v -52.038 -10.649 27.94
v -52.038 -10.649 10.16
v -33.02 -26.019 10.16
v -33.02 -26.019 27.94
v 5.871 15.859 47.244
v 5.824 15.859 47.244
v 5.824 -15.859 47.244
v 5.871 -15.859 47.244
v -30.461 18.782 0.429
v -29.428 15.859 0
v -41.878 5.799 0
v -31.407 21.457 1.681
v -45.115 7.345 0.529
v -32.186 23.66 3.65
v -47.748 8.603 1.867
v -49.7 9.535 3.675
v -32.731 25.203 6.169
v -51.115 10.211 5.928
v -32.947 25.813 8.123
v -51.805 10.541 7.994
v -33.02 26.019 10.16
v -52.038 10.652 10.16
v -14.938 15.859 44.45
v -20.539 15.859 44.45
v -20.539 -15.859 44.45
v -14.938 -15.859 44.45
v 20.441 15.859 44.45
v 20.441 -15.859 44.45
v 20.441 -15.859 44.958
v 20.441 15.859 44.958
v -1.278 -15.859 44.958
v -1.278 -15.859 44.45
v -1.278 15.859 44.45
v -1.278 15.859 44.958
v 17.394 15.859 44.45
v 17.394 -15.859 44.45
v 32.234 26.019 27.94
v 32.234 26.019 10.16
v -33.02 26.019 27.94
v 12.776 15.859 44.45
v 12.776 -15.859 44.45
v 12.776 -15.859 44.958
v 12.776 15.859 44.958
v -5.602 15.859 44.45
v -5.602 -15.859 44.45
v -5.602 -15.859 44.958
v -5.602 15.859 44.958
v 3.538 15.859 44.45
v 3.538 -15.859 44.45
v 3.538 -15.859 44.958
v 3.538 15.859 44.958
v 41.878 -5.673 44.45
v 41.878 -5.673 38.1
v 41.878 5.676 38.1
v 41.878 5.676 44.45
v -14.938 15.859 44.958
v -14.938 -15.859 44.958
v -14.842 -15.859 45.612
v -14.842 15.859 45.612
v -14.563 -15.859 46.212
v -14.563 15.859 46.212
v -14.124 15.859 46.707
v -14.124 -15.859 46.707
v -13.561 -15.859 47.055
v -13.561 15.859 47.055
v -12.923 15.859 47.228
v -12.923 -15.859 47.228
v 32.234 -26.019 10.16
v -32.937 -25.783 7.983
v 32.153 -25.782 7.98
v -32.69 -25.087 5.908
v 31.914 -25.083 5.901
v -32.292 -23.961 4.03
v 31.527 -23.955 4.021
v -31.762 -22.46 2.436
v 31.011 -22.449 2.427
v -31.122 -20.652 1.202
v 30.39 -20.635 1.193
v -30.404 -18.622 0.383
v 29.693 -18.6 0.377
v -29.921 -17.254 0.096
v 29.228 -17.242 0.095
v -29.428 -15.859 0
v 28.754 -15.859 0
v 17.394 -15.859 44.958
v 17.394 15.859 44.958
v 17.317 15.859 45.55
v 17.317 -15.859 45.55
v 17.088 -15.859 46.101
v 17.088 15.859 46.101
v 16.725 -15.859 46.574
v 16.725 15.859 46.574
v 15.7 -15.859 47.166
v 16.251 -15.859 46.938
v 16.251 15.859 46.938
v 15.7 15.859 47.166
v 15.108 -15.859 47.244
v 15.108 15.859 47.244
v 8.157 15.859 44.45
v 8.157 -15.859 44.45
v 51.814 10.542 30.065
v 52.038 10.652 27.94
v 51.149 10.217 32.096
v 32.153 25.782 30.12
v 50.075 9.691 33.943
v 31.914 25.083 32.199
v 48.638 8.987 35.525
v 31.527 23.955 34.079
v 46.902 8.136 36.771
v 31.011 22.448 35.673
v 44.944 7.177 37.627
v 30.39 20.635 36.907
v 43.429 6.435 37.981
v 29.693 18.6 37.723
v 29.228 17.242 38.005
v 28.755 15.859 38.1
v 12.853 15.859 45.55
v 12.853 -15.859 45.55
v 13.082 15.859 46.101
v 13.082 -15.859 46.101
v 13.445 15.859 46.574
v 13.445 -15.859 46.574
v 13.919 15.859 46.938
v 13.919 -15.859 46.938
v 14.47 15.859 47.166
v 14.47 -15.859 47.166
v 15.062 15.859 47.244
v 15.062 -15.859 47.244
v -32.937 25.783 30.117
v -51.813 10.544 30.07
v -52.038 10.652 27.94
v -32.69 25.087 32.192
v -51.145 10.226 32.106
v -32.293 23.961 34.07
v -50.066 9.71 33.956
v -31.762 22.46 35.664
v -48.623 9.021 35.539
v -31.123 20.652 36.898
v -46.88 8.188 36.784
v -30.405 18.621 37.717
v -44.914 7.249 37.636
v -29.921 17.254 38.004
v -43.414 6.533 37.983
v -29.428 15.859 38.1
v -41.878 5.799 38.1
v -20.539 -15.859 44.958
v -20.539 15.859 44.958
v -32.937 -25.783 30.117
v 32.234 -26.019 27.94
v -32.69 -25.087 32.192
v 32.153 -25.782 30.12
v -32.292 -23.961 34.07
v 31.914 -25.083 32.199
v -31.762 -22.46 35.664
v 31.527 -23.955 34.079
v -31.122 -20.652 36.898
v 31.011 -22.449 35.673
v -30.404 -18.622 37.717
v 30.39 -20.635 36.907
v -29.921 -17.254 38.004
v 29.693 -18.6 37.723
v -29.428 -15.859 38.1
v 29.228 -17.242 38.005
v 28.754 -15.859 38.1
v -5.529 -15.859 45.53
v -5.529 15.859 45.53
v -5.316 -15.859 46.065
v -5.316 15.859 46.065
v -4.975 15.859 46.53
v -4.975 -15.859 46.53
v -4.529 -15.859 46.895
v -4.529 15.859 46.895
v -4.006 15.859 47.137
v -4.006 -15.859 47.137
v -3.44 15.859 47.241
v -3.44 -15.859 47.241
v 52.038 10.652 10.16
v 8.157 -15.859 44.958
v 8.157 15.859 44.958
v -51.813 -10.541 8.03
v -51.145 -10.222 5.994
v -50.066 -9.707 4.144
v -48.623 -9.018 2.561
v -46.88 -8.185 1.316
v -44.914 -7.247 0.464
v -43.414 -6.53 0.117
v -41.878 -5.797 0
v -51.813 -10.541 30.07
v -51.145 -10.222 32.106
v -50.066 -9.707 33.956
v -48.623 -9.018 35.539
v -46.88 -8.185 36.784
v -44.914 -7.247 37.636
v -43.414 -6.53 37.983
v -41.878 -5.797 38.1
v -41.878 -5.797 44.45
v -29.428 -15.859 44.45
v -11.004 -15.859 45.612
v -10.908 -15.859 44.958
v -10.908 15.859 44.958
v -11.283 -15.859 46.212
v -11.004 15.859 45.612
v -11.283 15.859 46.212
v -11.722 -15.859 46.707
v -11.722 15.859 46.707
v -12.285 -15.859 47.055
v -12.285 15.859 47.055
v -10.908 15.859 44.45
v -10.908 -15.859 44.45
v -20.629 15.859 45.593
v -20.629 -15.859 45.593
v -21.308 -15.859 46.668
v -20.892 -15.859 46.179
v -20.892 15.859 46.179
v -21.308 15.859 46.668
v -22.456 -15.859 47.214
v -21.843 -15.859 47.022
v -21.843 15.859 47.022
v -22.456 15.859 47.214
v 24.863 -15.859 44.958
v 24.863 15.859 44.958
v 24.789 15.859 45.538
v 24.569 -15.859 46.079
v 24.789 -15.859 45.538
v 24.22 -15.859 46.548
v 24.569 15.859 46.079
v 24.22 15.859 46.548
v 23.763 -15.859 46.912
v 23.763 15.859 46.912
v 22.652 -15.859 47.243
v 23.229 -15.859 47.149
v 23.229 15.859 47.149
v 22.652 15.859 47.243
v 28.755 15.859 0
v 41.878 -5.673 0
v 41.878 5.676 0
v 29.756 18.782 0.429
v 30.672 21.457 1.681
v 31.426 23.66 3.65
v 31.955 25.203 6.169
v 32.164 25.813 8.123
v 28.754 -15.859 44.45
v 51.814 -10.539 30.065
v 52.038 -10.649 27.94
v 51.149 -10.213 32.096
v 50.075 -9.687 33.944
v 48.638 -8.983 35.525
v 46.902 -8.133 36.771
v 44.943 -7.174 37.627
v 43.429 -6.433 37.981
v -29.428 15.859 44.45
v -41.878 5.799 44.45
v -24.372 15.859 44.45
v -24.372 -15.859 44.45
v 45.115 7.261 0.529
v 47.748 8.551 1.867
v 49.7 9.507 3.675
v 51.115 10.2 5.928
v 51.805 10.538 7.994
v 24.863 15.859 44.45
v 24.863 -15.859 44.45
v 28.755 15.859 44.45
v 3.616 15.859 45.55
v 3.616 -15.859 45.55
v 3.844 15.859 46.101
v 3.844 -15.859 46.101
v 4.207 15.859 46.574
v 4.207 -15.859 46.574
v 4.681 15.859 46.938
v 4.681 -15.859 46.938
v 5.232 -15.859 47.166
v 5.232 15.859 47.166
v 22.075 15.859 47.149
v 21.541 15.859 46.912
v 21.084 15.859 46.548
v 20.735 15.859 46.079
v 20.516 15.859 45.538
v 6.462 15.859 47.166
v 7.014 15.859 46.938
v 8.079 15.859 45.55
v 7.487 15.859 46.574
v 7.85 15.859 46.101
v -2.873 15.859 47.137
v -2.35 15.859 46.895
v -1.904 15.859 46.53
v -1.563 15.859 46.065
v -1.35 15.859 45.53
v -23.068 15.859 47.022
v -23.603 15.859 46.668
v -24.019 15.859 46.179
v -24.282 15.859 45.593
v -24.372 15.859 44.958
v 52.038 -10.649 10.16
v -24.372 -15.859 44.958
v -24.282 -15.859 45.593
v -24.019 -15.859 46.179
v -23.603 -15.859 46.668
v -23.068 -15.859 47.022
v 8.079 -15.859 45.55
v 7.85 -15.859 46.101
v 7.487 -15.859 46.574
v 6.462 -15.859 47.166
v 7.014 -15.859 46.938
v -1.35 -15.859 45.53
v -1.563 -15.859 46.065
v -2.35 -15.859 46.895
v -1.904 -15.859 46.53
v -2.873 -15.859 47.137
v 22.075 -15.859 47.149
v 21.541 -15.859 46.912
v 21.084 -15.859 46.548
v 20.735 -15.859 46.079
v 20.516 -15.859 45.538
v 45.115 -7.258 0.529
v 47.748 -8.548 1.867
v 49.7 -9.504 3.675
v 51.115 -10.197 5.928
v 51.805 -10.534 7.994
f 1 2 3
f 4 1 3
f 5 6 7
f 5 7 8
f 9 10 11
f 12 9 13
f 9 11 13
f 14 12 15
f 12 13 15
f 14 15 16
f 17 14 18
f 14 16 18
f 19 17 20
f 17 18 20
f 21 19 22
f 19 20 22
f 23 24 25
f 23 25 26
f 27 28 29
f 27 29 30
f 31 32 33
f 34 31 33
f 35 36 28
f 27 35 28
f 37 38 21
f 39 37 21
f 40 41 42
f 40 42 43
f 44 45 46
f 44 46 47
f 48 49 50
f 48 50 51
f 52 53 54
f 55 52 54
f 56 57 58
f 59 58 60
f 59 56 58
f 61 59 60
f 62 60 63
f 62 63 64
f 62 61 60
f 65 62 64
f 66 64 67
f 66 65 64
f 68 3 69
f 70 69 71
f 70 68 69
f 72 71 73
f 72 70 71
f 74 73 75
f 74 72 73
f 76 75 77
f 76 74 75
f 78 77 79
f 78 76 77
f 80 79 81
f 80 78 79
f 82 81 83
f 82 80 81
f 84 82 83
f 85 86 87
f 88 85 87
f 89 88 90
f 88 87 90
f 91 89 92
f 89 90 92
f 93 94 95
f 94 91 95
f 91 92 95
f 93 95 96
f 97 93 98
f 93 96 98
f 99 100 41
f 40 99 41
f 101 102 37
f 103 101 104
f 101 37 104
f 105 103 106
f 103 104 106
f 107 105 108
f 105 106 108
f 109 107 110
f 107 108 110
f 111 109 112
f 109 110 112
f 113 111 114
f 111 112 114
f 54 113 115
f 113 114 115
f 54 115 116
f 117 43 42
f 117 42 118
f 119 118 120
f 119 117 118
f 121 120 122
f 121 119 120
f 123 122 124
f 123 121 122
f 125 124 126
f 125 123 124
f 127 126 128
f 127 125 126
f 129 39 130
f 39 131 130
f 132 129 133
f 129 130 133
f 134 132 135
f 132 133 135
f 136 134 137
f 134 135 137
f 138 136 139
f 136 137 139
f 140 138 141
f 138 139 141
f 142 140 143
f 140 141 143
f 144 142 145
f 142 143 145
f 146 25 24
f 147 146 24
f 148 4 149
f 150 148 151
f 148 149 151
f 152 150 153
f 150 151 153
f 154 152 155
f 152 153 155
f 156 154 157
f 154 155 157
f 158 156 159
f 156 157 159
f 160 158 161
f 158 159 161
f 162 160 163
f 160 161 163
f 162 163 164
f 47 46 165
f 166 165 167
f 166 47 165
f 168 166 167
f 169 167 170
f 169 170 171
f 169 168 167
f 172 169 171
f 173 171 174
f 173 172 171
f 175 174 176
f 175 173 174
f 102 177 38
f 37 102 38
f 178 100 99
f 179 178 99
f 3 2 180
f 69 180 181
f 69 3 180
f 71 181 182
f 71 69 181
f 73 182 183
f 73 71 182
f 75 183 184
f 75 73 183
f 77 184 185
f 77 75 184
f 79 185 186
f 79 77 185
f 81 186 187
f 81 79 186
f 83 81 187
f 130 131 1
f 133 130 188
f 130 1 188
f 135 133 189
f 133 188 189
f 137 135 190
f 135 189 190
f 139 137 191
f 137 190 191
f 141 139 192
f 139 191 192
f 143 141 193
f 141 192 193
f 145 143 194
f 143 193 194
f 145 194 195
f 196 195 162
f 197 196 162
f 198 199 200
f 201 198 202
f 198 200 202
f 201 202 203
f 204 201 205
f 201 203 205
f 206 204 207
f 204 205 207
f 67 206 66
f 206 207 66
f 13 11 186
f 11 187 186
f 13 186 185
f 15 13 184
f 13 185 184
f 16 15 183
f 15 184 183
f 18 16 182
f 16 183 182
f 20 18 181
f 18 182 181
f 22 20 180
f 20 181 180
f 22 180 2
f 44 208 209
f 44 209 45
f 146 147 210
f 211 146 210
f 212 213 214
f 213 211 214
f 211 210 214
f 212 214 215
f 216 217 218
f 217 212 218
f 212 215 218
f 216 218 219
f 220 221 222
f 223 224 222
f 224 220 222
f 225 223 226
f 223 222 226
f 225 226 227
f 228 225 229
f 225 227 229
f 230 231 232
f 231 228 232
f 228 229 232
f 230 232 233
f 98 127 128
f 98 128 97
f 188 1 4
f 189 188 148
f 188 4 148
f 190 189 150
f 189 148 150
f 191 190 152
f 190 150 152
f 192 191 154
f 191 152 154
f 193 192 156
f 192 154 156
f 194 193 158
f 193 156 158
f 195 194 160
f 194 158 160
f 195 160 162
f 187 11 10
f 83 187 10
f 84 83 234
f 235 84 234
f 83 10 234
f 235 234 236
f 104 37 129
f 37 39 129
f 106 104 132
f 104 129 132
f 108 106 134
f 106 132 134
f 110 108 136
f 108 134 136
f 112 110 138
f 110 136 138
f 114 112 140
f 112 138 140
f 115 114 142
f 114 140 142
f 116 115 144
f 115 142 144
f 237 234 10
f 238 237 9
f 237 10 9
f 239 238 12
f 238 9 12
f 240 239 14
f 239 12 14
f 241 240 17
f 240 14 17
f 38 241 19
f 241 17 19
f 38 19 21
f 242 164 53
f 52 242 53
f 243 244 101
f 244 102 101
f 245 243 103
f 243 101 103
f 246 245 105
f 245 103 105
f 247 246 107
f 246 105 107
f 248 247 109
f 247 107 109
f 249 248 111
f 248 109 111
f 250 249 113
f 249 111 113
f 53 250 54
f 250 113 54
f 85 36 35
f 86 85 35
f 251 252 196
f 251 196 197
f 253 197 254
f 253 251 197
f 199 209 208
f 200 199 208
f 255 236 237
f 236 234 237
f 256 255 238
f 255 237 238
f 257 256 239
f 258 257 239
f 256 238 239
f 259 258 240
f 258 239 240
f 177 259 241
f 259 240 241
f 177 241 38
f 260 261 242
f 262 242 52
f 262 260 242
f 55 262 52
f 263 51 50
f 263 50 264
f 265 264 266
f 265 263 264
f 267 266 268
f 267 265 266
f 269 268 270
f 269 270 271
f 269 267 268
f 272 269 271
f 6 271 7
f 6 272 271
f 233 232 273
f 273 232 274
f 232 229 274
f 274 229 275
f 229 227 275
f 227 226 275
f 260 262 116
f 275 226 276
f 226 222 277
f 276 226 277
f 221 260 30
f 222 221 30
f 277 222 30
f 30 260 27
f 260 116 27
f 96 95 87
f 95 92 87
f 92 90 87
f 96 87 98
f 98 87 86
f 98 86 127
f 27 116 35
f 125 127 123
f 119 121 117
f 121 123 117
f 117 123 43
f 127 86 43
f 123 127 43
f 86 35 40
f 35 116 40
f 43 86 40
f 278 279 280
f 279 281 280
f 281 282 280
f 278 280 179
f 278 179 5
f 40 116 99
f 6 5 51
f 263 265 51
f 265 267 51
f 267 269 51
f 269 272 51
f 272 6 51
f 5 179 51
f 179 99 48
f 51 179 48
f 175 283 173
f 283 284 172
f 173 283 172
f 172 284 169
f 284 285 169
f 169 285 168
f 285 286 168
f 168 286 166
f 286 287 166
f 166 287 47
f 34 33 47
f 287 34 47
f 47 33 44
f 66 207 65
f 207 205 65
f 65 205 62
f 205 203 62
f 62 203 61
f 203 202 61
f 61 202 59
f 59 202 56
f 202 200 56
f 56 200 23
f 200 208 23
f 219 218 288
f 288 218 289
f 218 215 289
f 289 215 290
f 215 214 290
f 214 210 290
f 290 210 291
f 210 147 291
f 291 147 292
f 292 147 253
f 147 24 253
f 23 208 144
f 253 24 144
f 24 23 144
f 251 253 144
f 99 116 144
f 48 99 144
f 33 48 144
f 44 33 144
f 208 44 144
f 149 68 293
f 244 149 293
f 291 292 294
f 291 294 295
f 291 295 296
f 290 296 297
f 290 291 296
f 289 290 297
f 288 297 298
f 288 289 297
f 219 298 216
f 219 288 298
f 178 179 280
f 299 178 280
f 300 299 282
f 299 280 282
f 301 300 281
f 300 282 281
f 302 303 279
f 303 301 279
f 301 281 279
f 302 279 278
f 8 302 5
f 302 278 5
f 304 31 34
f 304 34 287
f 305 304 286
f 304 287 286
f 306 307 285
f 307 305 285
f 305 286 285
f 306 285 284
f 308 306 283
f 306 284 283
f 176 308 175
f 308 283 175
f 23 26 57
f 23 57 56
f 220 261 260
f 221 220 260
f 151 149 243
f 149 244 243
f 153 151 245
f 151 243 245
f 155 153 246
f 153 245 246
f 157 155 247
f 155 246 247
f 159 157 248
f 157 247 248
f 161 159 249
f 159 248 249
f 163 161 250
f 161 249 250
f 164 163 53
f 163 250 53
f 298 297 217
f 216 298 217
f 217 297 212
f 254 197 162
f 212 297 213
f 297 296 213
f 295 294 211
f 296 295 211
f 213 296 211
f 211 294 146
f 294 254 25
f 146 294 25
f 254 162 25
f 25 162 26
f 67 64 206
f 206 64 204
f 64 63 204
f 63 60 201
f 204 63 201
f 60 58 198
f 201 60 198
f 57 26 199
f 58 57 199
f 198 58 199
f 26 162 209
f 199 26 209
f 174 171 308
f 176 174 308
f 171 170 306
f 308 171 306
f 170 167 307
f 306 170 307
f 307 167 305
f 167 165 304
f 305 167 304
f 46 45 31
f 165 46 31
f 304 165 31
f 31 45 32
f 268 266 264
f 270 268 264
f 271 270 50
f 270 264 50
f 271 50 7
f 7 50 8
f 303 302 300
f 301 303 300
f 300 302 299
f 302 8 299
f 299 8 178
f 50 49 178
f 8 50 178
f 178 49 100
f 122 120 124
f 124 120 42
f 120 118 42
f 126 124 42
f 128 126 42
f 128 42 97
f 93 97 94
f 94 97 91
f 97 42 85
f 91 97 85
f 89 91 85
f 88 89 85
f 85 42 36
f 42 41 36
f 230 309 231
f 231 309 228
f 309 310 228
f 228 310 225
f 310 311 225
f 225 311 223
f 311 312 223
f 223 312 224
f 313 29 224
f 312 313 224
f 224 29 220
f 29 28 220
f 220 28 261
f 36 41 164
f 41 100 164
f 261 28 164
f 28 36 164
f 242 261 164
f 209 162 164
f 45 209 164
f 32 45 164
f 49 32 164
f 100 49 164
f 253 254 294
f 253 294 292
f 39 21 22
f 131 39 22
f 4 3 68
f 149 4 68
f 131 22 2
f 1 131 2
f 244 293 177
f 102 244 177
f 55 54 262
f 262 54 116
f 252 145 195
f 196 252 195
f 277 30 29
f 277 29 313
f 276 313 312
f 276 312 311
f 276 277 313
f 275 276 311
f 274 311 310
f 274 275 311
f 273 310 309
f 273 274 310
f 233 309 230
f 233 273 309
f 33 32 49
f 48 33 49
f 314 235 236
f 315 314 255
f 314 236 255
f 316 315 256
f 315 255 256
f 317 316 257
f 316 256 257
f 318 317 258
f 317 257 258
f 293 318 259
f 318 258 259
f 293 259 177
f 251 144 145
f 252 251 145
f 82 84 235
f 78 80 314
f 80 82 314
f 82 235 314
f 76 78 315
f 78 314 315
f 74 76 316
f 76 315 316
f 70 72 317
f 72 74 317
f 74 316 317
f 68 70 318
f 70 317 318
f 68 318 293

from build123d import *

# Parameters (mm, degrees)
F1_DEPTH    = 38.1
F2_R        = 10.16
F3_R        = 10.16
F5_DEPTH    = 6.35
F6_W        = 3.8326773793
F6_H        = 31.7183228926
F6_W_2      = 4.029225558
F6_W_3      = 4.3240477098
F6_W_4      = 4.6188691631
F6_W_5      = 4.6188682318
F6_W_6      = 4.4223219156
F7_DEPTH    = 2.794
F8_T1_DEPTH = 43.1483228926


# Not quite as in the source:
# - a fillet or chamfer that OpenCascade refuses, or shapes differently, is made with other operations: its cross-section is extruded or revolved along the edge and cut away or added


with BuildPart() as f1:
    # F0 (on Top) → F1 (new body)
    with BuildSketch(Plane.XY):
        Polygon((-33.02, -26.0191614463), (32.2342477739, -26.0191614463), (52.0383228926, -10.6488130987), (52.0383228926, 10.6521614463), (32.2342477739, 26.0191614463), (-33.02, 26.0191614463), (-52.0383228926, 10.6521614463), (-52.0383228926, -10.6488130987), align=None)
    extrude(amount=F1_DEPTH)

    # F2
    f2_edges = [f1.edges().sort_by_distance(p)[0] for p in [
        (-0.392876, -26.019161, 38.1),
        (-42.529161, -18.333987, 38.1),
        (-52.038323, 0.001674, 38.1),
        (-42.529161, 18.335661, 38.1),
        (-0.392876, 26.019161, 38.1),
        (42.136285, 18.335661, 38.1),
        (52.038323, 0.001674, 38.1),
        (42.136285, -18.333987, 38.1),
    ]]
    fillet(f2_edges, radius=F2_R)

    # F3
    f3_edges = [f1.edges().sort_by_distance(p)[0] for p in [
        (-0.392876, -26.019161, 0),
        (-42.529161, -18.333987, 0),
        (-52.038323, 0.001674, 0),
        (-42.529161, 18.335661, 0),
        (-0.392876, 26.019161, 0),
        (42.136285, 18.335661, 0),
        (52.038323, 0.001674, 0),
        (42.136285, -18.333987, 0),
    ]]
    fillet(f3_edges, radius=F3_R)

    # F4 (on face) → F5 (join)
    with BuildSketch(Plane.XY.offset(38.1)):
        Polygon((-29.4282840059, 15.8591614463), (-41.8783228926, 5.7994023049), (-41.8783228926, -5.7967184312), (-29.4276753196, -15.8591614463), (28.7541399654, -15.8591614463), (41.8783228926, -5.6732142531), (41.8783228926, 5.6758979589), (28.7547389102, 15.8591614463), align=None)
    extrude(amount=F5_DEPTH)

    # F6 (on face) → F7 (join)
    with BuildSketch(Plane.XY.offset(44.45)):
        with Locations((-22.4555665627, 0)):
            Rectangle(F6_W, F6_H)
        with Locations((-12.9230059683, 0)):
            Rectangle(F6_W_2, F6_H)
        with Locations((-3.4395834082, 0)):
            Rectangle(F6_W_3, F6_H)
        with Locations((5.8472915553, 0)):
            Rectangle(F6_W_4, F6_H)
        with Locations((15.0850303471, 0)):
            Rectangle(F6_W_5, F6_H)
        with Locations((22.6521138102, 0)):
            Rectangle(F6_W_6, F6_H)
    extrude(amount=F7_DEPTH)

    # F8: fillet of radius 2.286 on 12 edges, made by hand

    # F8_s2 → F8_t1 (cut)
    with BuildSketch(Plane.XZ.offset(-21.5741614463)):
        with BuildLine():
            ThreePointArc((-20.5392278731, 44.958), (-21.2087817713, 46.5744461018), (-22.8252278731, 47.244))
            Line((-22.8252278731, 47.244), (-20.5392278731, 47.244))
            Line((-20.5392278731, 47.244), (-20.5392278731, 44.958))
        make_face()
        with BuildLine():
            ThreePointArc((-10.9083931893, 44.958), (-11.5779470875, 46.5744461018), (-13.1943931893, 47.244))
            Line((-13.1943931893, 47.244), (-10.9083931893, 47.244))
            Line((-10.9083931893, 47.244), (-10.9083931893, 44.958))
        make_face()
        with BuildLine():
            ThreePointArc((-1.2775595533, 44.958), (-1.9471134515, 46.5744461018), (-3.5635595533, 47.244))
            Line((-3.5635595533, 47.244), (-1.2775595533, 47.244))
            Line((-1.2775595533, 47.244), (-1.2775595533, 44.958))
        make_face()
        with BuildLine():
            ThreePointArc((8.1567261368, 44.958), (7.4871722386, 46.5744461018), (5.8707261368, 47.244))
            Line((5.8707261368, 47.244), (8.1567261368, 47.244))
            Line((8.1567261368, 47.244), (8.1567261368, 44.958))
        make_face()
        with BuildLine():
            ThreePointArc((17.394464463, 44.958), (16.7249105648, 46.5744461018), (15.108464463, 47.244))
            Line((15.108464463, 47.244), (17.394464463, 47.244))
            Line((17.394464463, 47.244), (17.394464463, 44.958))
        make_face()
        with BuildLine():
            ThreePointArc((24.863274768, 44.958), (24.1937208698, 46.5744461018), (22.577274768, 47.244))
            Line((22.577274768, 47.244), (24.863274768, 47.244))
            Line((24.863274768, 47.244), (24.863274768, 44.958))
        make_face()
        with BuildLine():
            ThreePointArc((20.4409528524, 44.958), (21.1105067506, 46.5744461018), (22.7269528524, 47.244))
            Line((22.7269528524, 47.244), (20.4409528524, 47.244))
            Line((20.4409528524, 47.244), (20.4409528524, 44.958))
        make_face()
        with BuildLine():
            ThreePointArc((12.7755962312, 44.958), (13.4451501294, 46.5744461018), (15.0615962312, 47.244))
            Line((15.0615962312, 47.244), (12.7755962312, 47.244))
            Line((12.7755962312, 47.244), (12.7755962312, 44.958))
        make_face()
        with BuildLine():
            ThreePointArc((3.5378569737, 44.958), (4.2074108719, 46.5744461018), (5.8238569737, 47.244))
            Line((5.8238569737, 47.244), (3.5378569737, 47.244))
            Line((3.5378569737, 47.244), (3.5378569737, 44.958))
        make_face()
        with BuildLine():
            ThreePointArc((-5.6016072631, 44.958), (-4.9320533649, 46.5744461018), (-3.3156072631, 47.244))
            Line((-3.3156072631, 47.244), (-5.6016072631, 47.244))
            Line((-5.6016072631, 47.244), (-5.6016072631, 44.958))
        make_face()
        with BuildLine():
            ThreePointArc((-14.9376187474, 44.958), (-14.2680648491, 46.5744461018), (-12.6516187474, 47.244))
            Line((-12.6516187474, 47.244), (-14.9376187474, 47.244))
            Line((-14.9376187474, 47.244), (-14.9376187474, 44.958))
        make_face()
        with BuildLine():
            ThreePointArc((-24.3719052523, 44.958), (-23.7023513541, 46.5744461018), (-22.0859052523, 47.244))
            Line((-22.0859052523, 47.244), (-24.3719052523, 47.244))
            Line((-24.3719052523, 47.244), (-24.3719052523, 44.958))
        make_face()
    extrude(amount=F8_T1_DEPTH, mode=Mode.SUBTRACT)


solid = f1.part
